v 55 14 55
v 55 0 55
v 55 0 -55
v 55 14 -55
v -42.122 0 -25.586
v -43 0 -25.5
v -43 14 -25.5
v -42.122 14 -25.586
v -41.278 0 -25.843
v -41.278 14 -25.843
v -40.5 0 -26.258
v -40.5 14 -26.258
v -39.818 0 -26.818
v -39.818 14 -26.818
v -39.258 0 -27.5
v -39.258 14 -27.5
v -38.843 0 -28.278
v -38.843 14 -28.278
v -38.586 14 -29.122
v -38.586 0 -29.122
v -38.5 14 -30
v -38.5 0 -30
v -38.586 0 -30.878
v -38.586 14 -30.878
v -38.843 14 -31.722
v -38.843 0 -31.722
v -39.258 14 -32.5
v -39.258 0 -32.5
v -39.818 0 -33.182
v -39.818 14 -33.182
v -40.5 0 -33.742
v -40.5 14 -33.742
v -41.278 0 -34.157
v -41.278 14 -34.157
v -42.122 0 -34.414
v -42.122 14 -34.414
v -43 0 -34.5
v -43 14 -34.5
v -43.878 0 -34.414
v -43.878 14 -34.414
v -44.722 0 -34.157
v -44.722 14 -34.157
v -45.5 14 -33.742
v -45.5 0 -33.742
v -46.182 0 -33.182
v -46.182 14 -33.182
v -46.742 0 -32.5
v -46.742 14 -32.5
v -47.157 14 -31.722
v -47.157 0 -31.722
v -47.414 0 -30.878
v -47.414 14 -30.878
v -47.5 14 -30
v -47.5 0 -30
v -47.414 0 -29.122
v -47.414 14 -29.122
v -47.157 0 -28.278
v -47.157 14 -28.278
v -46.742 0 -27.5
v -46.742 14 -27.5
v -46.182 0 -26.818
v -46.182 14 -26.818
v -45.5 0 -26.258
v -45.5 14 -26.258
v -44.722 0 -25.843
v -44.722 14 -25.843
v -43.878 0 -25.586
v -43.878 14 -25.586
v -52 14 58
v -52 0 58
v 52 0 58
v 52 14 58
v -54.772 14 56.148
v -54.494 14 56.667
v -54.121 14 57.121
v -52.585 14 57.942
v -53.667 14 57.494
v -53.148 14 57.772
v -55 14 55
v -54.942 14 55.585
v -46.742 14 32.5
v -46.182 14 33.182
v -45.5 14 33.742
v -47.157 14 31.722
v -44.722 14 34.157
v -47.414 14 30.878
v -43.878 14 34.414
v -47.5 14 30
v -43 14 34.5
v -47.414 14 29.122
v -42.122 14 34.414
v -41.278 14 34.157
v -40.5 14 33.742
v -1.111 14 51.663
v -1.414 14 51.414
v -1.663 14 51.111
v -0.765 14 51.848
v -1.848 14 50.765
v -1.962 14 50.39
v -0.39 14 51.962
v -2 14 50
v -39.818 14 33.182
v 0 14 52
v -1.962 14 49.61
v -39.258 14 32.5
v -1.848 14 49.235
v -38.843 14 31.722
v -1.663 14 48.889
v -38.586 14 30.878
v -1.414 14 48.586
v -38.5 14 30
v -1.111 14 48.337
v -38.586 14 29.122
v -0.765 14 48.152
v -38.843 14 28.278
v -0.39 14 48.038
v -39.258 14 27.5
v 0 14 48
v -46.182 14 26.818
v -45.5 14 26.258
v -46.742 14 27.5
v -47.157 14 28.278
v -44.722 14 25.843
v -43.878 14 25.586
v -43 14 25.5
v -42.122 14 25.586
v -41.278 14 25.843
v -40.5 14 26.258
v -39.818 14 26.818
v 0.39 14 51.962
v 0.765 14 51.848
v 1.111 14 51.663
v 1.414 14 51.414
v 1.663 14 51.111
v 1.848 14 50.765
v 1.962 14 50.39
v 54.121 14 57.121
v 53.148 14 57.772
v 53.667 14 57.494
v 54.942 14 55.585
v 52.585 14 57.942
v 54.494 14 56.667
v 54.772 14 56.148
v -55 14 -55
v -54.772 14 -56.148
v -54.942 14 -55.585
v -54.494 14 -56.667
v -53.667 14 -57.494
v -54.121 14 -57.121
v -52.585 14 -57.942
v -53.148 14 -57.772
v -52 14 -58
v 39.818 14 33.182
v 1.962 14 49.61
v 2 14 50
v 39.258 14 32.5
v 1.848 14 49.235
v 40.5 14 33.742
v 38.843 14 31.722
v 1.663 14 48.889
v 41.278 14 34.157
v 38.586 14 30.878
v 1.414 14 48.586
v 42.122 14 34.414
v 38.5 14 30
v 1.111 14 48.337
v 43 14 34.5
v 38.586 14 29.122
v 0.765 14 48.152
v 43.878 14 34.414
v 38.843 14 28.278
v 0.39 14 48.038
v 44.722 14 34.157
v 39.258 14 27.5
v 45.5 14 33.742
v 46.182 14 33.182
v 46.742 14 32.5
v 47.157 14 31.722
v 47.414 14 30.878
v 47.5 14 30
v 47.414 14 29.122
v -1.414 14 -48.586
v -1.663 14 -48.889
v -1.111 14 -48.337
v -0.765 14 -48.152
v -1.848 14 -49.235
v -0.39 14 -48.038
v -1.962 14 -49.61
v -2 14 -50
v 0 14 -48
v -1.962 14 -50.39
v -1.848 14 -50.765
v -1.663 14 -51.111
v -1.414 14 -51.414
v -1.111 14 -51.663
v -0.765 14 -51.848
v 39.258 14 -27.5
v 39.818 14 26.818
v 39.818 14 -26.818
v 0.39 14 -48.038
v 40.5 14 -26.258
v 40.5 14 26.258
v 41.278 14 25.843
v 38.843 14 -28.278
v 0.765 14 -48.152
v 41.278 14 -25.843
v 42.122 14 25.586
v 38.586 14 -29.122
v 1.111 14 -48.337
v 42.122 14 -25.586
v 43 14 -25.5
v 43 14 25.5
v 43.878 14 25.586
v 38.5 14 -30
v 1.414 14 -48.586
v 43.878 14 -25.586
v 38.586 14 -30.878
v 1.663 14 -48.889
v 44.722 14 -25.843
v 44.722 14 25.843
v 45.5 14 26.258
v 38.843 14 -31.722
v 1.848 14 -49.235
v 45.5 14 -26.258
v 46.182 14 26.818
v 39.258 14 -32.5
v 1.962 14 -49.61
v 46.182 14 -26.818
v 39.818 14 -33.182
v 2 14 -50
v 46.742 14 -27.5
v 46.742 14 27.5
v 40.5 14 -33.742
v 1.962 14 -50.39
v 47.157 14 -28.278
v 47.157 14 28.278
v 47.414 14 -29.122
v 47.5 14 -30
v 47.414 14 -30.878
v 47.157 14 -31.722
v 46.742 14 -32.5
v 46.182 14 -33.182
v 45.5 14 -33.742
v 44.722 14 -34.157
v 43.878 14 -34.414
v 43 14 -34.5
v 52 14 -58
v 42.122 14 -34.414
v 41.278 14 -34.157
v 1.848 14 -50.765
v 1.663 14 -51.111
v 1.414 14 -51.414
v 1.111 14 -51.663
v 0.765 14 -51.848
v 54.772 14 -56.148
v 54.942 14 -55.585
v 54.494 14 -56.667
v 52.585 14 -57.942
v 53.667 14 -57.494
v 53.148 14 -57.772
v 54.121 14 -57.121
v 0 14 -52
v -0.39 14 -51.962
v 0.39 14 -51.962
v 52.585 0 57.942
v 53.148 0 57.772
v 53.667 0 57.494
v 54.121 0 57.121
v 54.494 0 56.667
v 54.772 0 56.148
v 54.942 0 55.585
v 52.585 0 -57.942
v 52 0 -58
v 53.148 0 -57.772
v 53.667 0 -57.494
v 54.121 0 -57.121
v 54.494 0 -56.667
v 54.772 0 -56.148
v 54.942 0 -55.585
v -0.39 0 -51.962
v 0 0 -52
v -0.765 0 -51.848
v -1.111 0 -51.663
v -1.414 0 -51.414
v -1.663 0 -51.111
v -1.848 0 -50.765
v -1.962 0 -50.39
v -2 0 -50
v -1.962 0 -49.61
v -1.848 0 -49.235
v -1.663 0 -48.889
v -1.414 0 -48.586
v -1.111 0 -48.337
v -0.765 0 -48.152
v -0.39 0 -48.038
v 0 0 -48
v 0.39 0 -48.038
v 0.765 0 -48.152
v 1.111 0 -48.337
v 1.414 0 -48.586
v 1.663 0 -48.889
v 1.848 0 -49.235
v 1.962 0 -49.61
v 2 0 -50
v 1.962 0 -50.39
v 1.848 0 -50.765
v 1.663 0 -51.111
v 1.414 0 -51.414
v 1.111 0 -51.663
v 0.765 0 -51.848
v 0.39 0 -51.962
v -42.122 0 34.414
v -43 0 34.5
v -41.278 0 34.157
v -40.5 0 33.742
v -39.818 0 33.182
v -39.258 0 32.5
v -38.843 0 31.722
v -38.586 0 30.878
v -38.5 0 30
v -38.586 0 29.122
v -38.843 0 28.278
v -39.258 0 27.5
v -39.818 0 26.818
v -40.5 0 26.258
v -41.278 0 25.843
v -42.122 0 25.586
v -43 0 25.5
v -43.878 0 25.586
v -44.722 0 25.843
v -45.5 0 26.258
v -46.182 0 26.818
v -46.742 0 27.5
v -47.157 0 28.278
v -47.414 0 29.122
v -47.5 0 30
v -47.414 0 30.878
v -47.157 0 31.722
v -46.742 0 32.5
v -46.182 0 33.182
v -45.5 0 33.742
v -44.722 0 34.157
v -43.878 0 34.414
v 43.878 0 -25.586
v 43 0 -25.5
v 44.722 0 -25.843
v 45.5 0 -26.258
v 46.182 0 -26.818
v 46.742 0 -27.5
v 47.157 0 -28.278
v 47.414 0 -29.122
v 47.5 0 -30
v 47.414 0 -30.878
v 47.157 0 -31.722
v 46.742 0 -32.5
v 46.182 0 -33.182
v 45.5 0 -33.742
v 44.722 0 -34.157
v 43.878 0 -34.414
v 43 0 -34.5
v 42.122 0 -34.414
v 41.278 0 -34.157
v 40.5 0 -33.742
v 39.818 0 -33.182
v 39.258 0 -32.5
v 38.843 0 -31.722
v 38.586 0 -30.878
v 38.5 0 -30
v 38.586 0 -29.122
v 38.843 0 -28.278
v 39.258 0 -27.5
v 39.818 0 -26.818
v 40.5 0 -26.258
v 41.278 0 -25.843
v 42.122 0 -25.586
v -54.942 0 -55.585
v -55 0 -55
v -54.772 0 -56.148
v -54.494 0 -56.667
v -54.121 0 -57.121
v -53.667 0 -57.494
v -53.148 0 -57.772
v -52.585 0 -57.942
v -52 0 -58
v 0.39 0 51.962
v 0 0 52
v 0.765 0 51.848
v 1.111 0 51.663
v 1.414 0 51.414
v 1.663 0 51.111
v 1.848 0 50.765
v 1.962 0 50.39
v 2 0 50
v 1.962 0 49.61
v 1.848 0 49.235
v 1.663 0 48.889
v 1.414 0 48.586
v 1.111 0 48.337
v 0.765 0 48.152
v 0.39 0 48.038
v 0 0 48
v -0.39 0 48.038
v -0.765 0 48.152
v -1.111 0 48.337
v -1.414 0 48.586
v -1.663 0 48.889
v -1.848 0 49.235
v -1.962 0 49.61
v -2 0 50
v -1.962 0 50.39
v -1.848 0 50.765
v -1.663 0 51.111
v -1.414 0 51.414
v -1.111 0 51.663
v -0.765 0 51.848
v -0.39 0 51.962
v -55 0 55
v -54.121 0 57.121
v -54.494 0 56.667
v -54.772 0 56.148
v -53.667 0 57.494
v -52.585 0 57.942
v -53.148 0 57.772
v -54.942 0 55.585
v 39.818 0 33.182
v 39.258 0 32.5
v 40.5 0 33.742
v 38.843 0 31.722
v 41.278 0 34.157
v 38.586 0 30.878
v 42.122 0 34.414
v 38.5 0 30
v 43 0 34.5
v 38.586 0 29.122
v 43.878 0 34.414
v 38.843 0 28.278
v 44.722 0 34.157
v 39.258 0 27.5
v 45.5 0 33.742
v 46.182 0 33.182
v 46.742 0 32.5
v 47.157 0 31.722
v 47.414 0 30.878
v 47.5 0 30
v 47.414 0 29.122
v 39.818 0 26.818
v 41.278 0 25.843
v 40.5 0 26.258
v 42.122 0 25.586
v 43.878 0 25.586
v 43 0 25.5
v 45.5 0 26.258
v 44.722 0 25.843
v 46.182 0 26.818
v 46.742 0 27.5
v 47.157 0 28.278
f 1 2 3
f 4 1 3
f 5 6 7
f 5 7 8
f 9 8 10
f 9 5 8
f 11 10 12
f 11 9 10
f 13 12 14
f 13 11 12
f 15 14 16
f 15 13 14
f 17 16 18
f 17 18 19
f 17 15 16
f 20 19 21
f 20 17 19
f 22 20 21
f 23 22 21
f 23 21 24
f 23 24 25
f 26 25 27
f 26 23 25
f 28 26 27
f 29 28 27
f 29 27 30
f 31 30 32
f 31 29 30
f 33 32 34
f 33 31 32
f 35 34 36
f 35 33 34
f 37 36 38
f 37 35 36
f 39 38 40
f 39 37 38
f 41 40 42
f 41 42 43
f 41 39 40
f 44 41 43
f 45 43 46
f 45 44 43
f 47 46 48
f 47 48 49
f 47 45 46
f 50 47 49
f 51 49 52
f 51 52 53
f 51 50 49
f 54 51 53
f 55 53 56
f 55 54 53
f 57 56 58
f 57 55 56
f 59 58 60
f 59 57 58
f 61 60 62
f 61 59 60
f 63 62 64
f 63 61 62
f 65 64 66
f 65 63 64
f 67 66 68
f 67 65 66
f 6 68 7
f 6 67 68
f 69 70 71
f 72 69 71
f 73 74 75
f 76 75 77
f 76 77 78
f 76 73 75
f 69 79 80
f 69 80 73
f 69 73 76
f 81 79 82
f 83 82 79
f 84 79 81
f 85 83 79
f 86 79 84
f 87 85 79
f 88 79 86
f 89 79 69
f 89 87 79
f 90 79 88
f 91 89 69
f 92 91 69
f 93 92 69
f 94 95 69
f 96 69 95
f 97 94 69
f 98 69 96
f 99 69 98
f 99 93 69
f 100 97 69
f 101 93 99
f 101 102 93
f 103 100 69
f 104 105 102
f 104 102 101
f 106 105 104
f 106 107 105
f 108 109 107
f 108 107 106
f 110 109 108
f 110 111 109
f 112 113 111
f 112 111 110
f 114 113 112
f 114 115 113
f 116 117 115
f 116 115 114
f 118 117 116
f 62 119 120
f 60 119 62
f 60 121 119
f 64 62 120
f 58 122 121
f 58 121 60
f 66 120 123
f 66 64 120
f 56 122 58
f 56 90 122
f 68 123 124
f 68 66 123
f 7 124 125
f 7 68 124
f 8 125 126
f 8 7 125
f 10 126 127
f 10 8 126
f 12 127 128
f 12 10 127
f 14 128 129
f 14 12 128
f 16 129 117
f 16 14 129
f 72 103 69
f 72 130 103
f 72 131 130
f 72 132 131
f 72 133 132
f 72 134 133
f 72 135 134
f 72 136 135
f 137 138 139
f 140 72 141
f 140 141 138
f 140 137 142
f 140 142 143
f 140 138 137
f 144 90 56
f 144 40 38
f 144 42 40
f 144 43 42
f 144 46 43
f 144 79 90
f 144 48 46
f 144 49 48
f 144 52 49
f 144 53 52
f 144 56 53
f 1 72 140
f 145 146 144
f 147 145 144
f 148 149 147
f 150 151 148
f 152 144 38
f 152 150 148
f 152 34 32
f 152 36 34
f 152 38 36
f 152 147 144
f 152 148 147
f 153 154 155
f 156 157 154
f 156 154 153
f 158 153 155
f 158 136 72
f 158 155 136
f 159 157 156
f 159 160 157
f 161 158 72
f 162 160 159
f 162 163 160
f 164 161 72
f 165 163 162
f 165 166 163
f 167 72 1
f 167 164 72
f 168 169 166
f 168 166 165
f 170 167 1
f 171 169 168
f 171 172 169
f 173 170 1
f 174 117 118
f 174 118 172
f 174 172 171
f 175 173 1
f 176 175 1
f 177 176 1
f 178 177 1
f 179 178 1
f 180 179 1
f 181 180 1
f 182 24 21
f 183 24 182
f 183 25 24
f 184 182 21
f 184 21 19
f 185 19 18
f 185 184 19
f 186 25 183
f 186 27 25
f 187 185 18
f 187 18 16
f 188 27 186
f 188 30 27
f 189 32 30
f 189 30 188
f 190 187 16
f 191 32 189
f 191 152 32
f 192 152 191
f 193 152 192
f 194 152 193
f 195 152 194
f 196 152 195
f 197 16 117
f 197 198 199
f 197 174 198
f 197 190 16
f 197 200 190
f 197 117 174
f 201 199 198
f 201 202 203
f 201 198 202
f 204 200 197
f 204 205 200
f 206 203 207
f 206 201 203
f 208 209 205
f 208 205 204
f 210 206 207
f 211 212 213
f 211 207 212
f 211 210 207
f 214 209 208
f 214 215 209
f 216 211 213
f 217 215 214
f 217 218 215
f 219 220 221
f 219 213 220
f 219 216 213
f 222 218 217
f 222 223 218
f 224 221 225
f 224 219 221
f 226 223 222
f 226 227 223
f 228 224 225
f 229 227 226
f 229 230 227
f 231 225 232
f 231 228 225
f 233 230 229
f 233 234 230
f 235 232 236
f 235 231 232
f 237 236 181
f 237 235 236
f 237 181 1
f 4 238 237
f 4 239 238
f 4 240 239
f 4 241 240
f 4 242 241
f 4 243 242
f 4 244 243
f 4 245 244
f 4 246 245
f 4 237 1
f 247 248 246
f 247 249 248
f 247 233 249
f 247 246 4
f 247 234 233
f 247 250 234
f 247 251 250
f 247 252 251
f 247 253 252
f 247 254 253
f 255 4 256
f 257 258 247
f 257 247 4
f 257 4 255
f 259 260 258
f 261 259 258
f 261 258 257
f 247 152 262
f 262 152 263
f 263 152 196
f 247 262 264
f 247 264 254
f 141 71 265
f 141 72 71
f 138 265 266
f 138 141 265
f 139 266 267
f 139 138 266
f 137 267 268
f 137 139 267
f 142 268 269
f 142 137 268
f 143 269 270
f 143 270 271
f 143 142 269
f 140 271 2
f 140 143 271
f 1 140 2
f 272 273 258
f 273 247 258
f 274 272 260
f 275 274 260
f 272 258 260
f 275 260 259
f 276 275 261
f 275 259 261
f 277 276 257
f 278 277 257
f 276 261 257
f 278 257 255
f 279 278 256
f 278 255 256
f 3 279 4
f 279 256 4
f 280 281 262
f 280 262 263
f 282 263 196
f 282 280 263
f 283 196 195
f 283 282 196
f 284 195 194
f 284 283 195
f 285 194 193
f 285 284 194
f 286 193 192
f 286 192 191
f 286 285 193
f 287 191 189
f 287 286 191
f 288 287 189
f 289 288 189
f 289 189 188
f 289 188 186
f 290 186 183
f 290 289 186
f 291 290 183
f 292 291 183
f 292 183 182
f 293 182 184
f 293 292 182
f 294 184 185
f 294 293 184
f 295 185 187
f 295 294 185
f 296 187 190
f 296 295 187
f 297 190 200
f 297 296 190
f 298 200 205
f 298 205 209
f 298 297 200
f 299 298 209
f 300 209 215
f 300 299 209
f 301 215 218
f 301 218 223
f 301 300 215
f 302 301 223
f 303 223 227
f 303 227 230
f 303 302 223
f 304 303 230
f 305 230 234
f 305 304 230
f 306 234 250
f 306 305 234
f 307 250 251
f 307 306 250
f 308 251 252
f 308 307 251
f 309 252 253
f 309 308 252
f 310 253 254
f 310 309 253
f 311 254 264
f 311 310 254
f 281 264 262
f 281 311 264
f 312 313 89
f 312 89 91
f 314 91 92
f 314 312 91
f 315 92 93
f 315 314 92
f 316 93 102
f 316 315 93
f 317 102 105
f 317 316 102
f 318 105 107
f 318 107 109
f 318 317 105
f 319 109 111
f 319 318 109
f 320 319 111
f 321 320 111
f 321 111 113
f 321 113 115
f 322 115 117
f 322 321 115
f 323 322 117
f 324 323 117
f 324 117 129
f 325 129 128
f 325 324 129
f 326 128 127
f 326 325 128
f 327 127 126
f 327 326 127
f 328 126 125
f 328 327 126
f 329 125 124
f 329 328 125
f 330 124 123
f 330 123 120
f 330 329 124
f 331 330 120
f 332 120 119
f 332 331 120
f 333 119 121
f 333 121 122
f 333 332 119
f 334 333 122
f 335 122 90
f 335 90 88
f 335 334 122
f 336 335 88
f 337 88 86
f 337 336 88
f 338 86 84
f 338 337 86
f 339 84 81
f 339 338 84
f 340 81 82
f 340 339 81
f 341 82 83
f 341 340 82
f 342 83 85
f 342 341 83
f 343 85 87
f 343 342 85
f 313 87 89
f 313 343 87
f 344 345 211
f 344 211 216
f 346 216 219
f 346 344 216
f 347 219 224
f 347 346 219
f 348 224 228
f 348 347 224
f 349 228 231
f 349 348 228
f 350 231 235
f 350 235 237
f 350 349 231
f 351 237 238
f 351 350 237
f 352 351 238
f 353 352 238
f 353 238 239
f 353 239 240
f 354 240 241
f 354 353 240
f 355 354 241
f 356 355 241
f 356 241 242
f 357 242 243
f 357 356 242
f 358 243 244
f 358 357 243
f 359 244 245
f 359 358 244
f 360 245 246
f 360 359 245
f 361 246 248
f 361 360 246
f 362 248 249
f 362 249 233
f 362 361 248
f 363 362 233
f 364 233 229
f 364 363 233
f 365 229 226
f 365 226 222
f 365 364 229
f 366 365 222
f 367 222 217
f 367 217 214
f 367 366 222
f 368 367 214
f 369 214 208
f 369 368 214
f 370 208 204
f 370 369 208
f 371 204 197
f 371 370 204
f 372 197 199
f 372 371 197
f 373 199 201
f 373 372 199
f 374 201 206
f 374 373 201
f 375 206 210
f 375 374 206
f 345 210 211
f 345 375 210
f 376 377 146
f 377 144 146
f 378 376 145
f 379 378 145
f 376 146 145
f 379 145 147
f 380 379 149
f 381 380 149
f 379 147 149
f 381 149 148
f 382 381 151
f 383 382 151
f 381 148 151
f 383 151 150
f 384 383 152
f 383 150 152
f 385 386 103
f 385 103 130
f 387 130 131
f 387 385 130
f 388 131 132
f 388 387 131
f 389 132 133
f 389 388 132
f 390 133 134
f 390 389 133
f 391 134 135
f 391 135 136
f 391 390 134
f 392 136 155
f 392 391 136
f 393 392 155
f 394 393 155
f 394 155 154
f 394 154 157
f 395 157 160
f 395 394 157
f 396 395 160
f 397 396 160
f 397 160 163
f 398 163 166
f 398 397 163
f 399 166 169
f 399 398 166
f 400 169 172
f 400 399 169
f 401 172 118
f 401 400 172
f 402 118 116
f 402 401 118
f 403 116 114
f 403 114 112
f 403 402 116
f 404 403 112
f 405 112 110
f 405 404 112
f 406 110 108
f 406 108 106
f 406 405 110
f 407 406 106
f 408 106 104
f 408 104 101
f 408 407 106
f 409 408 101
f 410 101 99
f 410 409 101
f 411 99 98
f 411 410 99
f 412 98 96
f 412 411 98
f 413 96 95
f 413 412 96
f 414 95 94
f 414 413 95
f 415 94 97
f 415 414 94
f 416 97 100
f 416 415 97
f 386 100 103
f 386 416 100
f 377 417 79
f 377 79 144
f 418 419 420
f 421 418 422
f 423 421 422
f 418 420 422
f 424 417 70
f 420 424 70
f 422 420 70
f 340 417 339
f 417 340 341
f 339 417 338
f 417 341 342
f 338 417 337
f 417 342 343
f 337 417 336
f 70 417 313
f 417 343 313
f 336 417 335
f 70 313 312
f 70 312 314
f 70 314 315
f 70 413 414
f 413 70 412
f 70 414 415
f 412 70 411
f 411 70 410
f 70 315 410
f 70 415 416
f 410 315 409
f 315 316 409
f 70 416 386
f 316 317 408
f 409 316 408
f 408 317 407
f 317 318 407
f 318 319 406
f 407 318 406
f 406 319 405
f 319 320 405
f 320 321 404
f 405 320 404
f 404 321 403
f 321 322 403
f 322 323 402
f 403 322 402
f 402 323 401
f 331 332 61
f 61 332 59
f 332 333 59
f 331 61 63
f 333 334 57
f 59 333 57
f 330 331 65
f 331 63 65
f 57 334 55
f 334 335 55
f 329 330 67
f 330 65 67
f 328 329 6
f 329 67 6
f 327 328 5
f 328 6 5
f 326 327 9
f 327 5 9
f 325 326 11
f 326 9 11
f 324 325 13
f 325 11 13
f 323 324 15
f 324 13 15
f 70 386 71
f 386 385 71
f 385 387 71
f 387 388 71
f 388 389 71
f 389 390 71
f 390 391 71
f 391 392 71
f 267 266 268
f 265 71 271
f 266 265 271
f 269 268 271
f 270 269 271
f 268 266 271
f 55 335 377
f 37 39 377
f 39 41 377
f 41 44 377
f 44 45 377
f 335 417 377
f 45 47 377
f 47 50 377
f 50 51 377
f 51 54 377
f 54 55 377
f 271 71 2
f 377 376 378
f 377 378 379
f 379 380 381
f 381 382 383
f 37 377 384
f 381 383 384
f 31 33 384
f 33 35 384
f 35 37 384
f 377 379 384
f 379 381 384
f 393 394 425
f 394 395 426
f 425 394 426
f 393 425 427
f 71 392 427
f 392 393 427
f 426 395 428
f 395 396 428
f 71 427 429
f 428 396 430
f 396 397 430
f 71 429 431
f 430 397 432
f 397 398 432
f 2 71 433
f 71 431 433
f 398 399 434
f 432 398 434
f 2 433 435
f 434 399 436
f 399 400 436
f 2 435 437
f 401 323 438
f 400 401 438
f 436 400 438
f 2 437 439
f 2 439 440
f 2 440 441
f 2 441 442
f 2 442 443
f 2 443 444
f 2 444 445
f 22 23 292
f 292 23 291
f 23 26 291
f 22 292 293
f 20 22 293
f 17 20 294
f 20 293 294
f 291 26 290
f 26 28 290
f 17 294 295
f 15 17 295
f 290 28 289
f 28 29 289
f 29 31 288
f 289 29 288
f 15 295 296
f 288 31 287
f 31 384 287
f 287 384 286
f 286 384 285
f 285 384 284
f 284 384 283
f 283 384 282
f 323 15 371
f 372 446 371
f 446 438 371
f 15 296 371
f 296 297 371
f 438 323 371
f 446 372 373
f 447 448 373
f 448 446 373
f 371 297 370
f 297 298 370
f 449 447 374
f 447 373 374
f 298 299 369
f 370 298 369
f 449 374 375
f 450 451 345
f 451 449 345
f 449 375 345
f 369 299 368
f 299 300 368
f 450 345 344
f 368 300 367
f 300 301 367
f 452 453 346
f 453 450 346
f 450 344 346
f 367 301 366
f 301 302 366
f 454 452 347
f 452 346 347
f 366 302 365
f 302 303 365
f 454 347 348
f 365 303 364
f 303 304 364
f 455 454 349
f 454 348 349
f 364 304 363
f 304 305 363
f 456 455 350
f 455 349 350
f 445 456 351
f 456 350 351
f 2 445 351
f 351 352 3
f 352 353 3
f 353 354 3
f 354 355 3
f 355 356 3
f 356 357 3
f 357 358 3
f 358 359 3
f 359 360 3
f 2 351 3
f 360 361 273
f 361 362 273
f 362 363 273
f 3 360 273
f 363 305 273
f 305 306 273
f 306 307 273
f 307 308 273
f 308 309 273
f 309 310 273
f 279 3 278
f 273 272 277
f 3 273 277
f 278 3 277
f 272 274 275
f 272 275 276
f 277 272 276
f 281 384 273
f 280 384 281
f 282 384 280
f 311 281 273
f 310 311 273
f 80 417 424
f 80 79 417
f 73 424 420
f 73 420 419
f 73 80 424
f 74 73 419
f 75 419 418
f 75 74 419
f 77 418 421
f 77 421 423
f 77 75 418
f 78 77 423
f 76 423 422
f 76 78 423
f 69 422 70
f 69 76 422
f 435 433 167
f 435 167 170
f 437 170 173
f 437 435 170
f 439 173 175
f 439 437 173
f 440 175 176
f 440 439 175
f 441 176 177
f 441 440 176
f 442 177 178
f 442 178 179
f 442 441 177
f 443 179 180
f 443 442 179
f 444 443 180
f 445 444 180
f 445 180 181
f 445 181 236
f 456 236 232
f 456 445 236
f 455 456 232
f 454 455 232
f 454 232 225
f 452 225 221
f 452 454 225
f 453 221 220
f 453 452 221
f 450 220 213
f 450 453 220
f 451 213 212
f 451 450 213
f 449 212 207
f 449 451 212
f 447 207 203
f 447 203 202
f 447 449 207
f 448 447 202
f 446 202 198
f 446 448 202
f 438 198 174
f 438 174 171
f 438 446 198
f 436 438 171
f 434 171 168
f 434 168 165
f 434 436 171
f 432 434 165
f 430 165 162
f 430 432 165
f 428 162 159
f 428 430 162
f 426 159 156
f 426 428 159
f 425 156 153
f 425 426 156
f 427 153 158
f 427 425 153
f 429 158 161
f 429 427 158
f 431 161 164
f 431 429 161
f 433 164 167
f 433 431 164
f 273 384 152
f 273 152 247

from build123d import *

# Parameters (mm, degrees)
SKETCH_1_W      = 110
SKETCH_1_H      = 116
SKETCH_1_R      = 4.5
SKETCH_1_R_2    = 2
EXTRUDE_1_DEPTH = 14
FILLET_1_R      = 3


with BuildPart() as part:
    # 草图1 → 凸台-拉伸1 (new body)
    with BuildSketch(Plane(origin=(0, 0, 0), x_dir=(1, 0, 0), z_dir=(0, 1, 0))):
        Rectangle(SKETCH_1_W, SKETCH_1_H)
        with Locations(Location((-43, 30, 0), (0, 0, 270))):
            Circle(SKETCH_1_R, mode=Mode.SUBTRACT)
        with Locations(Location((43, 30, 0), (0, 0, 270))):
            Circle(SKETCH_1_R, mode=Mode.SUBTRACT)
        with Locations(Location((43, -30, 0), (0, 0, 270))):
            Circle(SKETCH_1_R, mode=Mode.SUBTRACT)
        with Locations(Location((-43, -30, 0), (0, 0, 270))):
            Circle(SKETCH_1_R, mode=Mode.SUBTRACT)
        with Locations(Location((0, -50, 0), (0, 0, 270))):
            Circle(SKETCH_1_R_2, mode=Mode.SUBTRACT)
        with Locations(Location((0, 50, 0), (0, 0, 90))):
            Circle(SKETCH_1_R_2, mode=Mode.SUBTRACT)
    extrude(amount=EXTRUDE_1_DEPTH)

    # 圆角1
    fillet_1_edges = [part.edges().sort_by_distance(p)[0] for p in [
        (-55, 7, -58),
        (55, 7, -58),
        (55, 7, 58),
        (-55, 7, 58),
    ]]
    fillet(fillet_1_edges, radius=FILLET_1_R)


solid = part.part
